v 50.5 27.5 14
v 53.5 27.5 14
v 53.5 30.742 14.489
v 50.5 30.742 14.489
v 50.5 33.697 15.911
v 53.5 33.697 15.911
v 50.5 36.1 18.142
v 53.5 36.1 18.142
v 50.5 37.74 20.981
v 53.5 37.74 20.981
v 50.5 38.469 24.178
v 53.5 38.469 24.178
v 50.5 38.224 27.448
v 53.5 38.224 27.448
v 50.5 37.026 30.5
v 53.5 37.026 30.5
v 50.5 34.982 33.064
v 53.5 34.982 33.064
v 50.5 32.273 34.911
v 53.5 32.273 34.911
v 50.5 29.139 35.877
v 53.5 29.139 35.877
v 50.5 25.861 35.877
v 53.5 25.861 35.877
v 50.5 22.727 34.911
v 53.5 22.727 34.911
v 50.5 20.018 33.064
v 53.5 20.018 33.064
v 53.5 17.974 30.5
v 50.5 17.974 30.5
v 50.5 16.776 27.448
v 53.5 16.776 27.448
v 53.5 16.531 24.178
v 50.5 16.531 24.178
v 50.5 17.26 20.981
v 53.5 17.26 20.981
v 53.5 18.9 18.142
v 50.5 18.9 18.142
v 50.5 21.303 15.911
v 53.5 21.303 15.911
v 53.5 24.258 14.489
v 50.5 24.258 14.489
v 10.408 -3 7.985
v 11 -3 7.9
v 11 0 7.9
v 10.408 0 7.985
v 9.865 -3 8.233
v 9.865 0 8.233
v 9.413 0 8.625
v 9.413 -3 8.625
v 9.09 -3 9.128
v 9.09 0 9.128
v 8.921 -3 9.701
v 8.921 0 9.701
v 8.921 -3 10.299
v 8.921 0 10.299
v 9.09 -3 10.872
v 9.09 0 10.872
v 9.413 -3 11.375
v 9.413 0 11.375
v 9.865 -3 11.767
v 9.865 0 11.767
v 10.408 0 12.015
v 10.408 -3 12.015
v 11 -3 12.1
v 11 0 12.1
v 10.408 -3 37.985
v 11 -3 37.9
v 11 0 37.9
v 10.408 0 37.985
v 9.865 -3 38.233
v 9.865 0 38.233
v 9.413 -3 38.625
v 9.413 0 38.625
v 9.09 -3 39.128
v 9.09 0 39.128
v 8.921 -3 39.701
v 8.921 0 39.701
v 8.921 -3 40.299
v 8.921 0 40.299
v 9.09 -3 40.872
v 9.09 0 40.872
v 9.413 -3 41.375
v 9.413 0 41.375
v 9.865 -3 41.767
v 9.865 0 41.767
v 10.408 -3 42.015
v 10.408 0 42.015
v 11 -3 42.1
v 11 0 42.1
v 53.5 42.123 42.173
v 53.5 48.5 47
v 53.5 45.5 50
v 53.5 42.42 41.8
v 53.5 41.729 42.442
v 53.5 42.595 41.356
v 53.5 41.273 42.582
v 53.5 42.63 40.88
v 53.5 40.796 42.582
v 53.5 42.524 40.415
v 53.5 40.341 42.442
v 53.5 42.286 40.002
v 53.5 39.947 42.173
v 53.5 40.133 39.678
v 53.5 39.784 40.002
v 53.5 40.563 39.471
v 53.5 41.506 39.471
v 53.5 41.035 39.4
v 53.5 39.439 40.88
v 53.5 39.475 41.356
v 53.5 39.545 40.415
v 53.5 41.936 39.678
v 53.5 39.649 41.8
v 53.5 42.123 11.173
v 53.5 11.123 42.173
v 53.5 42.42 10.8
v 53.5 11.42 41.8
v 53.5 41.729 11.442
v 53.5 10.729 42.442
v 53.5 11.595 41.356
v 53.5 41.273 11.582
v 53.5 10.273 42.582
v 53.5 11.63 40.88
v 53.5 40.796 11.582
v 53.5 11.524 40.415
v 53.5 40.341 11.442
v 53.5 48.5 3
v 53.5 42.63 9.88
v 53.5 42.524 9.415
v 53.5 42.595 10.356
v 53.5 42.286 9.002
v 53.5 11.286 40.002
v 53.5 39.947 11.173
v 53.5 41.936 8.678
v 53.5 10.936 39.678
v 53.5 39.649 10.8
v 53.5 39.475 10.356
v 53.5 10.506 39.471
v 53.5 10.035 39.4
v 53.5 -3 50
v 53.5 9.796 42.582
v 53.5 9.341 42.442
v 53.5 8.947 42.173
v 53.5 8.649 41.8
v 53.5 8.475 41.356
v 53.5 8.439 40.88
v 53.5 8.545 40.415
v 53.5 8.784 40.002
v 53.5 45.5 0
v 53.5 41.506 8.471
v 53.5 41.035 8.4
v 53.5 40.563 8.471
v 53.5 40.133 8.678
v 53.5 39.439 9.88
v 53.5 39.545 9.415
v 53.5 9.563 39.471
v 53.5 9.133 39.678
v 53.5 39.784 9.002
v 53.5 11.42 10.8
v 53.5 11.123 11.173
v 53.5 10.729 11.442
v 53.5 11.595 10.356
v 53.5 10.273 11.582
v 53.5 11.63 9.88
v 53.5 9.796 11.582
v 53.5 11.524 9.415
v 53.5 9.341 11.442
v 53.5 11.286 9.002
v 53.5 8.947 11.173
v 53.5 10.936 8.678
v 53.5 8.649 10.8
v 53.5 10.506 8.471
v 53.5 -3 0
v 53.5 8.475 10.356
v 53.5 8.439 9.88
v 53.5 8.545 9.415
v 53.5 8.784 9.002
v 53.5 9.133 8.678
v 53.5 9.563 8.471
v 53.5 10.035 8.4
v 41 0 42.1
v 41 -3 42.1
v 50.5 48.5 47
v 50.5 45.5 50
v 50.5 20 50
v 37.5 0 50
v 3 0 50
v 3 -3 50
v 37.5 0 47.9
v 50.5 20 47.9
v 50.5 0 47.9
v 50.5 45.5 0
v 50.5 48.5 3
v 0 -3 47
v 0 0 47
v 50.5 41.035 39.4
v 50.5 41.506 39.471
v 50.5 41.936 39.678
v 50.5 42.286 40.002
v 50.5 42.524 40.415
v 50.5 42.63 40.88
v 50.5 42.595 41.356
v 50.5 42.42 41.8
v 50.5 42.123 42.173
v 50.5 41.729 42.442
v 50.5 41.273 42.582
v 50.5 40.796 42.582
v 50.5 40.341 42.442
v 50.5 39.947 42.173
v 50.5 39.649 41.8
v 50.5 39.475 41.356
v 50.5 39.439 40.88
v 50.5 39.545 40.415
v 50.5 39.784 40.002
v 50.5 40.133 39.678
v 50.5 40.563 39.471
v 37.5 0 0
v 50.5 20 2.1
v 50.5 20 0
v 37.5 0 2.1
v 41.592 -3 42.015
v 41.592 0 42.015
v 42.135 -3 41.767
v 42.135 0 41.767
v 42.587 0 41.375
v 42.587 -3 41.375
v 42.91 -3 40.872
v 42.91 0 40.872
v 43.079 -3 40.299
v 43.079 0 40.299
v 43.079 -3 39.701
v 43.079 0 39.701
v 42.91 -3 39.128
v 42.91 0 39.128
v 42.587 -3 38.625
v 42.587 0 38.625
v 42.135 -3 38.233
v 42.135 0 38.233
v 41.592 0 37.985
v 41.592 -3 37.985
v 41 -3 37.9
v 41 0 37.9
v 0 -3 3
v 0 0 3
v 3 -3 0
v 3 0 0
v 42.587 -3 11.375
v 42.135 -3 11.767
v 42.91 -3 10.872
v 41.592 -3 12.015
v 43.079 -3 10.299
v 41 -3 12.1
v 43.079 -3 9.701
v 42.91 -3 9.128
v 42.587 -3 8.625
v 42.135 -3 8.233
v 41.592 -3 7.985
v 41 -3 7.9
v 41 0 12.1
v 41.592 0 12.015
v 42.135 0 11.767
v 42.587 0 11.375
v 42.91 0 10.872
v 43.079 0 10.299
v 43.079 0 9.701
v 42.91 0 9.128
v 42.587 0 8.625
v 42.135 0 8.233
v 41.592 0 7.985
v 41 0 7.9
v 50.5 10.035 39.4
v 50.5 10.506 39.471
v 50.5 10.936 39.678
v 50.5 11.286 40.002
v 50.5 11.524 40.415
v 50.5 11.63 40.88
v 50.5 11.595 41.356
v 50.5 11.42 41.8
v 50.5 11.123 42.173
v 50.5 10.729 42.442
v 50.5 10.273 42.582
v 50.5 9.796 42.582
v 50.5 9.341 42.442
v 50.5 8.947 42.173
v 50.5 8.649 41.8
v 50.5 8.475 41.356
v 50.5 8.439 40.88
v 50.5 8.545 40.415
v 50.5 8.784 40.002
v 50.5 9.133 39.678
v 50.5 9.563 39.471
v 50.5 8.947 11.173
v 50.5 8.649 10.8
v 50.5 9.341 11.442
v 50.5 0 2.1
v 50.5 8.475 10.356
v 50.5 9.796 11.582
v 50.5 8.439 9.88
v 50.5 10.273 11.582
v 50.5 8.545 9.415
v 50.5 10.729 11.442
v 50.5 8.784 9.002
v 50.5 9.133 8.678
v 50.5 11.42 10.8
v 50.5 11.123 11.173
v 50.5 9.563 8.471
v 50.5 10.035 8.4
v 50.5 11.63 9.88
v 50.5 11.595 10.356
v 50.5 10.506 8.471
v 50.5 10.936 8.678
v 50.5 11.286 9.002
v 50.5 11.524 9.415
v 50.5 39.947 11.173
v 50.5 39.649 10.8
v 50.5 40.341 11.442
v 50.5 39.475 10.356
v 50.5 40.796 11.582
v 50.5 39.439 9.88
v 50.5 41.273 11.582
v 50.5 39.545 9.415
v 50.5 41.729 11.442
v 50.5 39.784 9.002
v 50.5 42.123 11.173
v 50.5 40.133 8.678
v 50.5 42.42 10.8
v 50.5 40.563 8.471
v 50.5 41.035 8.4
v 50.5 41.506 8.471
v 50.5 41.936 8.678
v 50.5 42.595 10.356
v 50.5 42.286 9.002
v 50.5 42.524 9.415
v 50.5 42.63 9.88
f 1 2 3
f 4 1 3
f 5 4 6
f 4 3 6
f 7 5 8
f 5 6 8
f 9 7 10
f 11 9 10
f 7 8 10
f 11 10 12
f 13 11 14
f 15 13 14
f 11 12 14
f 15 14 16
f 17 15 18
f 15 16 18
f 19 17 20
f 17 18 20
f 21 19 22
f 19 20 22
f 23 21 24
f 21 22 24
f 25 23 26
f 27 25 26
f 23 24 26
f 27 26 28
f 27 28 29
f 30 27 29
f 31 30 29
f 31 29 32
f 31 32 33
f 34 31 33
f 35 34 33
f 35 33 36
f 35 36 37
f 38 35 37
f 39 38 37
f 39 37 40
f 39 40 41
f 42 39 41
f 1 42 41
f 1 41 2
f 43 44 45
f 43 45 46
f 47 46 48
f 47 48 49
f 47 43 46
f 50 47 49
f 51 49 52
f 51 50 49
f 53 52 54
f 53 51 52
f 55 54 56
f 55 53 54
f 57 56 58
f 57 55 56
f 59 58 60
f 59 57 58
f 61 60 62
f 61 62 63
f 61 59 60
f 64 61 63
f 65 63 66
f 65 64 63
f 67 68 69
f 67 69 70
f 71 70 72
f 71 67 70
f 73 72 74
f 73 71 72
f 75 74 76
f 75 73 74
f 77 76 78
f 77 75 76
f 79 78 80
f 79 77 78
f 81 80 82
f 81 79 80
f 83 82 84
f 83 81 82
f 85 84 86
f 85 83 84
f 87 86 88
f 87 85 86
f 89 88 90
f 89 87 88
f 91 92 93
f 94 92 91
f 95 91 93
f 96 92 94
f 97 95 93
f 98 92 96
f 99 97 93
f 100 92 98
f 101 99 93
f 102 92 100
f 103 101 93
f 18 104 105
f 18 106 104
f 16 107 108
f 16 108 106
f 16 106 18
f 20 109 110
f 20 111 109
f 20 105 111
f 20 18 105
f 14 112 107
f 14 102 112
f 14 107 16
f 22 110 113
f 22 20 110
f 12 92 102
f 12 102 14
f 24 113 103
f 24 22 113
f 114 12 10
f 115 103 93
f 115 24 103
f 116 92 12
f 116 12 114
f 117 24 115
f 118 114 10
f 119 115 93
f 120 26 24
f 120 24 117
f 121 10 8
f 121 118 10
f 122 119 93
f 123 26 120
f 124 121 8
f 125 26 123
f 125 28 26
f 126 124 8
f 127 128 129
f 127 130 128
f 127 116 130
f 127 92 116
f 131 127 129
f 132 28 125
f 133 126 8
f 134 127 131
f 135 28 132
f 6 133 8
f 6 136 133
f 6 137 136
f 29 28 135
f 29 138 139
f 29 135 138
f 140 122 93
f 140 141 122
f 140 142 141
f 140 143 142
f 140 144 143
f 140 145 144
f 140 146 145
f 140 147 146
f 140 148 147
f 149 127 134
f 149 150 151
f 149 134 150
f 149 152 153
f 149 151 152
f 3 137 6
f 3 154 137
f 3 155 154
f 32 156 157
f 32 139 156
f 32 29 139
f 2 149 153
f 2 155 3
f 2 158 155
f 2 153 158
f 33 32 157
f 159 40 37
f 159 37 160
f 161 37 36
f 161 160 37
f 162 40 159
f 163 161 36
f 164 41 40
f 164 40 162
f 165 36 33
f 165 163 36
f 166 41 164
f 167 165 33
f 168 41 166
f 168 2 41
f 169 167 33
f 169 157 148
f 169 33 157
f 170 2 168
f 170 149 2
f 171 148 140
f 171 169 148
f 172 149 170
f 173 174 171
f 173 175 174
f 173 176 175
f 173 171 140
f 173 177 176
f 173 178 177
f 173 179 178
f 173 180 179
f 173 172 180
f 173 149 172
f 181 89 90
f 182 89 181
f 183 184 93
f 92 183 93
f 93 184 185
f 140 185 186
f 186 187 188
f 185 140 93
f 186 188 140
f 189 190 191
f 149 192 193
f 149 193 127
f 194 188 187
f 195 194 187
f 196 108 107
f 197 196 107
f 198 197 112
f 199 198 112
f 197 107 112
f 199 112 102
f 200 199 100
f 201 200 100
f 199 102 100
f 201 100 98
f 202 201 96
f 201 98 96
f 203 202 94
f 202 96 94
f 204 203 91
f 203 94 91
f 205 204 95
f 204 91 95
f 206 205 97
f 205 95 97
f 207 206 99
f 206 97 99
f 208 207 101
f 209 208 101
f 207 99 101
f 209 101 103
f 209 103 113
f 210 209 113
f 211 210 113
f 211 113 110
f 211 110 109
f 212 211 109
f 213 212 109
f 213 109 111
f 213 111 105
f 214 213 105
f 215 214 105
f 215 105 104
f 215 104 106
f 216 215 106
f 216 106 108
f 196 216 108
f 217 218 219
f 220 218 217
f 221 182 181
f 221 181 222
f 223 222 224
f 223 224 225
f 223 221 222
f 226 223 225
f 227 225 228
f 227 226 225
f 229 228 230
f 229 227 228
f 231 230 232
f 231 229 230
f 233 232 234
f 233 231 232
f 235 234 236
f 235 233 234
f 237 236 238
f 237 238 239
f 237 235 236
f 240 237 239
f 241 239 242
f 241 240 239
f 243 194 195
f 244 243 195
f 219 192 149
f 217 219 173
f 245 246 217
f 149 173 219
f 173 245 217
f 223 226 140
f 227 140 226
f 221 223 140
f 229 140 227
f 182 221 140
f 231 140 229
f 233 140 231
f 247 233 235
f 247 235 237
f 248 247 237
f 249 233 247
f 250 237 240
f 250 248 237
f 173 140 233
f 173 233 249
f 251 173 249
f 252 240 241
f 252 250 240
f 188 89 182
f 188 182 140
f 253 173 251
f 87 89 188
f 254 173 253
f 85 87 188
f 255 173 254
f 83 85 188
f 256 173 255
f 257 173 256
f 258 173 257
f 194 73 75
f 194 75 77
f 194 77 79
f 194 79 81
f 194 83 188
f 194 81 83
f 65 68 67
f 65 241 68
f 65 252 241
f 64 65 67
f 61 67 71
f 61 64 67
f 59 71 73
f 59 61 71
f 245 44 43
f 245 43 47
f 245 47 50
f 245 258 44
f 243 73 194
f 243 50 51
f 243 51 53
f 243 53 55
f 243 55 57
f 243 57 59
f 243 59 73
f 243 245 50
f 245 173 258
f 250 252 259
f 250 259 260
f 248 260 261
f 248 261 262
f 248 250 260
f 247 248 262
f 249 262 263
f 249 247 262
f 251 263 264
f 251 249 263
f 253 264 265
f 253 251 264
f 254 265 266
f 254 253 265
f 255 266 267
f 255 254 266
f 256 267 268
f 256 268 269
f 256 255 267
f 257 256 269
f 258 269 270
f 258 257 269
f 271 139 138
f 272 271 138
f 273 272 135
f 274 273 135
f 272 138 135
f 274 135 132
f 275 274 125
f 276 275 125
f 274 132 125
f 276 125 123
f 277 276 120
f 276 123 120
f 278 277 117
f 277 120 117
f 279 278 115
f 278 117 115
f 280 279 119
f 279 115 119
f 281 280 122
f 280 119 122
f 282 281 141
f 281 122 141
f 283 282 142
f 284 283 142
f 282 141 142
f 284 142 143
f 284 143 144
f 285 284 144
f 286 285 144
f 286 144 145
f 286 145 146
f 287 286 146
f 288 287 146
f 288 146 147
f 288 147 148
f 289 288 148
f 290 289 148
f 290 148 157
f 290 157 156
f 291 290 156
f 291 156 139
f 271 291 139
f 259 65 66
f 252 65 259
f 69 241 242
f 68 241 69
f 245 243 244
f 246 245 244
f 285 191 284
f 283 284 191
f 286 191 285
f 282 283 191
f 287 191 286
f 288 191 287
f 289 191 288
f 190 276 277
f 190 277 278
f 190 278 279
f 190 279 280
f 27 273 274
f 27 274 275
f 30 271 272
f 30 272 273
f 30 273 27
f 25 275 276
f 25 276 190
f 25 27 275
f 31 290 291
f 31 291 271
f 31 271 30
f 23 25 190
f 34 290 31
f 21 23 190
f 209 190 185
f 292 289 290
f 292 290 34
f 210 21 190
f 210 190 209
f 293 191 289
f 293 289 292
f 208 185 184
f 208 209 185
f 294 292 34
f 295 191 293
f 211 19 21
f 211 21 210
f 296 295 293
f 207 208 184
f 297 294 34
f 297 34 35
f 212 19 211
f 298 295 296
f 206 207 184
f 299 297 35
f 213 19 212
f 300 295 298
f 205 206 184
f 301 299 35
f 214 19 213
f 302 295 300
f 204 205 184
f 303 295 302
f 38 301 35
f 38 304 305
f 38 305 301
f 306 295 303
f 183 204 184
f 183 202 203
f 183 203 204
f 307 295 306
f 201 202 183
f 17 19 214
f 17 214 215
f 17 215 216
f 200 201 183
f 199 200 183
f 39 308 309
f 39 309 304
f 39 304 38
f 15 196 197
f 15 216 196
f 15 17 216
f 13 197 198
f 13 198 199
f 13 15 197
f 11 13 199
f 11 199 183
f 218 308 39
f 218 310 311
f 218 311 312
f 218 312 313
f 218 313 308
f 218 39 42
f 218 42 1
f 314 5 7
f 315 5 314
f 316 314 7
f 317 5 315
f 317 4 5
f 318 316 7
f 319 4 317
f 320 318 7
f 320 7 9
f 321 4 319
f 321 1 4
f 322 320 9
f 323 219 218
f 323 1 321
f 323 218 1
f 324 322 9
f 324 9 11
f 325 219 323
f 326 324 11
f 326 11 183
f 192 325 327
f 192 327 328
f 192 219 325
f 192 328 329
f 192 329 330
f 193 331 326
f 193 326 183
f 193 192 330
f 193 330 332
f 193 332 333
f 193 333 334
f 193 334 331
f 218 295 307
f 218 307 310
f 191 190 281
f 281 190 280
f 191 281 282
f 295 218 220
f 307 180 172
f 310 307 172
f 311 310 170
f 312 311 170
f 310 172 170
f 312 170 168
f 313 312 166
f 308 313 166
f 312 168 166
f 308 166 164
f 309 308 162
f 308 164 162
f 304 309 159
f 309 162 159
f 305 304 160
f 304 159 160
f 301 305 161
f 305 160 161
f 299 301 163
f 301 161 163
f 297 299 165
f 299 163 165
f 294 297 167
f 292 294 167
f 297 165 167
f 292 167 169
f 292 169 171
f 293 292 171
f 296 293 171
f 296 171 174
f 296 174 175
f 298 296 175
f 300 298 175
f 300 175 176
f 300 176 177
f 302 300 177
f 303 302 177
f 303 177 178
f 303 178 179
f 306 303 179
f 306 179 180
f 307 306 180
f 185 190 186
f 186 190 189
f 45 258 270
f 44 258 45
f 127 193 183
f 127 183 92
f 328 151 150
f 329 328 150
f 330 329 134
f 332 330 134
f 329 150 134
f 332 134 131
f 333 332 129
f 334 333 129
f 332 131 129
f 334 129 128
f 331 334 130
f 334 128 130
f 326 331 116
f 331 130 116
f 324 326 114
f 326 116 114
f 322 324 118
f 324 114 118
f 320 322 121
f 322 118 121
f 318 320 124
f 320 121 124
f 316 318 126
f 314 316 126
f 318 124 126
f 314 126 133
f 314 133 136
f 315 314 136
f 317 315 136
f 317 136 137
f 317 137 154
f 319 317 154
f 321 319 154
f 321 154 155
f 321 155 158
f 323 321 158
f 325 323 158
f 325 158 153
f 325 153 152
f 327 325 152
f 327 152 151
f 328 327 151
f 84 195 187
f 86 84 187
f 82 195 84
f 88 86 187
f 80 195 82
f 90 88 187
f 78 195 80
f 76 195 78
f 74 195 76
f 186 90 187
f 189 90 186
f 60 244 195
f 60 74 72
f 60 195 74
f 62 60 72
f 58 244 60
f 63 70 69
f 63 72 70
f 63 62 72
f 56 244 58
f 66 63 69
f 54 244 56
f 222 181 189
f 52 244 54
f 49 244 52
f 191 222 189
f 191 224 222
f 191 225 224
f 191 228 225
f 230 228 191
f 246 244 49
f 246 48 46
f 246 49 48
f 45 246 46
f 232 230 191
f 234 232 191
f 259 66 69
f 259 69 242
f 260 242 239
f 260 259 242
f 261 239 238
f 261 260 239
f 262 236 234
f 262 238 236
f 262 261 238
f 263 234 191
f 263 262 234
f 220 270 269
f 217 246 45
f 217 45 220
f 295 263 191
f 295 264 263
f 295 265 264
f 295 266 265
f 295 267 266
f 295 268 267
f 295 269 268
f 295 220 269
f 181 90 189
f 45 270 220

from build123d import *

# Parameters (mm, degrees)
EXTRUDE_1_DEPTH             = 50
HOLE_WIZARD_1_D             = 22
HOLE_WIZARD_1_DEPTH         = 100
HOLE_WIZARD_2_D             = 3.2
HOLE_WIZARD_2_DEPTH         = 100
HOLE_START                  = -3
HOLE_WIZARD_4_2_4_2_1_DEPTH = 3
RIB_1_REACH                 = 89.832
SKETCH_13_WALL_W            = 201.518173748
SKETCH_13_WALL_H            = 2.1
CHAMFER_1_SIZE              = 3


# Read off the part's stored shape, not the designer's step: Ø4.2 (4.2) 直径槽口1
with BuildPart() as part:
    # 草图1 → 凸台-拉伸1 (new body)
    with BuildSketch(Plane.XY):
        Polygon((0, 0), (50.5, 0), (50.5, 48.5), (53.5, 48.5), (53.5, -3), (0, -3), align=None)
    extrude(amount=EXTRUDE_1_DEPTH)

    # 孔1
    with Locations(Plane.ZY.offset(-50.5)):
        with Locations((25, 27.5)):
            Hole(HOLE_WIZARD_1_D / 2, depth=HOLE_WIZARD_1_DEPTH)

    # 孔2
    with Locations(Plane.ZY.offset(-50.5)):
        with Locations((10, 41.034802043), (41, 41.034802043), (41, 10.034802043), (10, 10.034802043)):
            Hole(HOLE_WIZARD_2_D / 2, depth=HOLE_WIZARD_2_DEPTH)

    # Ø4.2 (4.2) 直径槽口1 outline → Ø4.2 (4.2) 直径槽口1 (cut)
    with BuildSketch(Plane(origin=(0, 0, 0), x_dir=(1, 0, 0), z_dir=(0, 1, 0)).offset(HOLE_START)):
        with BuildLine():
            Line((11, -42.1), (41, -42.1))
            ThreePointArc((41, -42.1), (43.1, -40), (41, -37.9))
            Line((41, -37.9), (11, -37.9))
            ThreePointArc((11, -37.9), (8.9, -40), (11, -42.1))
        make_face()
        with BuildLine():
            Line((11, -12.1), (41, -12.1))
            ThreePointArc((41, -12.1), (43.1, -10), (41, -7.9))
            Line((41, -7.9), (11, -7.9))
            ThreePointArc((11, -7.9), (8.9, -10), (11, -12.1))
        make_face()
    extrude(amount=HOLE_WIZARD_4_2_4_2_1_DEPTH, mode=Mode.SUBTRACT)

    # 草图13 wall → 筋1 (add, up to next)
    with BuildSketch(Plane(origin=(44, 10, 50), x_dir=(-0.544988350595, -0.838443616301, 0), z_dir=(0.838443616301, -0.544988350595, 0)), mode=Mode.PRIVATE) as rib_1_sk1:
        with Locations((0, 1.05)):
            Rectangle(SKETCH_13_WALL_W, SKETCH_13_WALL_H)
    rib_1_tool1 = extrude(rib_1_sk1.sketch, amount=RIB_1_REACH, mode=Mode.PRIVATE) - part.part
    rib_1 = rib_1_tool1.solids().sort_by_distance((44, 10, 50))[0]
    add(rib_1)

    # 镜向1: 筋1 across plane
    add(rib_1.mirror(Plane.XY.offset(25)))

    # 倒角1
    chamfer_1_edges = [part.edges().sort_by_distance(p)[0] for p in [
        (52, 48.5, 50),
        (0, -1.5, 50),
        (52, 48.5, 0),
        (0, -1.5, 0),
    ]]
    chamfer(chamfer_1_edges, length=CHAMFER_1_SIZE)


solid = part.part
